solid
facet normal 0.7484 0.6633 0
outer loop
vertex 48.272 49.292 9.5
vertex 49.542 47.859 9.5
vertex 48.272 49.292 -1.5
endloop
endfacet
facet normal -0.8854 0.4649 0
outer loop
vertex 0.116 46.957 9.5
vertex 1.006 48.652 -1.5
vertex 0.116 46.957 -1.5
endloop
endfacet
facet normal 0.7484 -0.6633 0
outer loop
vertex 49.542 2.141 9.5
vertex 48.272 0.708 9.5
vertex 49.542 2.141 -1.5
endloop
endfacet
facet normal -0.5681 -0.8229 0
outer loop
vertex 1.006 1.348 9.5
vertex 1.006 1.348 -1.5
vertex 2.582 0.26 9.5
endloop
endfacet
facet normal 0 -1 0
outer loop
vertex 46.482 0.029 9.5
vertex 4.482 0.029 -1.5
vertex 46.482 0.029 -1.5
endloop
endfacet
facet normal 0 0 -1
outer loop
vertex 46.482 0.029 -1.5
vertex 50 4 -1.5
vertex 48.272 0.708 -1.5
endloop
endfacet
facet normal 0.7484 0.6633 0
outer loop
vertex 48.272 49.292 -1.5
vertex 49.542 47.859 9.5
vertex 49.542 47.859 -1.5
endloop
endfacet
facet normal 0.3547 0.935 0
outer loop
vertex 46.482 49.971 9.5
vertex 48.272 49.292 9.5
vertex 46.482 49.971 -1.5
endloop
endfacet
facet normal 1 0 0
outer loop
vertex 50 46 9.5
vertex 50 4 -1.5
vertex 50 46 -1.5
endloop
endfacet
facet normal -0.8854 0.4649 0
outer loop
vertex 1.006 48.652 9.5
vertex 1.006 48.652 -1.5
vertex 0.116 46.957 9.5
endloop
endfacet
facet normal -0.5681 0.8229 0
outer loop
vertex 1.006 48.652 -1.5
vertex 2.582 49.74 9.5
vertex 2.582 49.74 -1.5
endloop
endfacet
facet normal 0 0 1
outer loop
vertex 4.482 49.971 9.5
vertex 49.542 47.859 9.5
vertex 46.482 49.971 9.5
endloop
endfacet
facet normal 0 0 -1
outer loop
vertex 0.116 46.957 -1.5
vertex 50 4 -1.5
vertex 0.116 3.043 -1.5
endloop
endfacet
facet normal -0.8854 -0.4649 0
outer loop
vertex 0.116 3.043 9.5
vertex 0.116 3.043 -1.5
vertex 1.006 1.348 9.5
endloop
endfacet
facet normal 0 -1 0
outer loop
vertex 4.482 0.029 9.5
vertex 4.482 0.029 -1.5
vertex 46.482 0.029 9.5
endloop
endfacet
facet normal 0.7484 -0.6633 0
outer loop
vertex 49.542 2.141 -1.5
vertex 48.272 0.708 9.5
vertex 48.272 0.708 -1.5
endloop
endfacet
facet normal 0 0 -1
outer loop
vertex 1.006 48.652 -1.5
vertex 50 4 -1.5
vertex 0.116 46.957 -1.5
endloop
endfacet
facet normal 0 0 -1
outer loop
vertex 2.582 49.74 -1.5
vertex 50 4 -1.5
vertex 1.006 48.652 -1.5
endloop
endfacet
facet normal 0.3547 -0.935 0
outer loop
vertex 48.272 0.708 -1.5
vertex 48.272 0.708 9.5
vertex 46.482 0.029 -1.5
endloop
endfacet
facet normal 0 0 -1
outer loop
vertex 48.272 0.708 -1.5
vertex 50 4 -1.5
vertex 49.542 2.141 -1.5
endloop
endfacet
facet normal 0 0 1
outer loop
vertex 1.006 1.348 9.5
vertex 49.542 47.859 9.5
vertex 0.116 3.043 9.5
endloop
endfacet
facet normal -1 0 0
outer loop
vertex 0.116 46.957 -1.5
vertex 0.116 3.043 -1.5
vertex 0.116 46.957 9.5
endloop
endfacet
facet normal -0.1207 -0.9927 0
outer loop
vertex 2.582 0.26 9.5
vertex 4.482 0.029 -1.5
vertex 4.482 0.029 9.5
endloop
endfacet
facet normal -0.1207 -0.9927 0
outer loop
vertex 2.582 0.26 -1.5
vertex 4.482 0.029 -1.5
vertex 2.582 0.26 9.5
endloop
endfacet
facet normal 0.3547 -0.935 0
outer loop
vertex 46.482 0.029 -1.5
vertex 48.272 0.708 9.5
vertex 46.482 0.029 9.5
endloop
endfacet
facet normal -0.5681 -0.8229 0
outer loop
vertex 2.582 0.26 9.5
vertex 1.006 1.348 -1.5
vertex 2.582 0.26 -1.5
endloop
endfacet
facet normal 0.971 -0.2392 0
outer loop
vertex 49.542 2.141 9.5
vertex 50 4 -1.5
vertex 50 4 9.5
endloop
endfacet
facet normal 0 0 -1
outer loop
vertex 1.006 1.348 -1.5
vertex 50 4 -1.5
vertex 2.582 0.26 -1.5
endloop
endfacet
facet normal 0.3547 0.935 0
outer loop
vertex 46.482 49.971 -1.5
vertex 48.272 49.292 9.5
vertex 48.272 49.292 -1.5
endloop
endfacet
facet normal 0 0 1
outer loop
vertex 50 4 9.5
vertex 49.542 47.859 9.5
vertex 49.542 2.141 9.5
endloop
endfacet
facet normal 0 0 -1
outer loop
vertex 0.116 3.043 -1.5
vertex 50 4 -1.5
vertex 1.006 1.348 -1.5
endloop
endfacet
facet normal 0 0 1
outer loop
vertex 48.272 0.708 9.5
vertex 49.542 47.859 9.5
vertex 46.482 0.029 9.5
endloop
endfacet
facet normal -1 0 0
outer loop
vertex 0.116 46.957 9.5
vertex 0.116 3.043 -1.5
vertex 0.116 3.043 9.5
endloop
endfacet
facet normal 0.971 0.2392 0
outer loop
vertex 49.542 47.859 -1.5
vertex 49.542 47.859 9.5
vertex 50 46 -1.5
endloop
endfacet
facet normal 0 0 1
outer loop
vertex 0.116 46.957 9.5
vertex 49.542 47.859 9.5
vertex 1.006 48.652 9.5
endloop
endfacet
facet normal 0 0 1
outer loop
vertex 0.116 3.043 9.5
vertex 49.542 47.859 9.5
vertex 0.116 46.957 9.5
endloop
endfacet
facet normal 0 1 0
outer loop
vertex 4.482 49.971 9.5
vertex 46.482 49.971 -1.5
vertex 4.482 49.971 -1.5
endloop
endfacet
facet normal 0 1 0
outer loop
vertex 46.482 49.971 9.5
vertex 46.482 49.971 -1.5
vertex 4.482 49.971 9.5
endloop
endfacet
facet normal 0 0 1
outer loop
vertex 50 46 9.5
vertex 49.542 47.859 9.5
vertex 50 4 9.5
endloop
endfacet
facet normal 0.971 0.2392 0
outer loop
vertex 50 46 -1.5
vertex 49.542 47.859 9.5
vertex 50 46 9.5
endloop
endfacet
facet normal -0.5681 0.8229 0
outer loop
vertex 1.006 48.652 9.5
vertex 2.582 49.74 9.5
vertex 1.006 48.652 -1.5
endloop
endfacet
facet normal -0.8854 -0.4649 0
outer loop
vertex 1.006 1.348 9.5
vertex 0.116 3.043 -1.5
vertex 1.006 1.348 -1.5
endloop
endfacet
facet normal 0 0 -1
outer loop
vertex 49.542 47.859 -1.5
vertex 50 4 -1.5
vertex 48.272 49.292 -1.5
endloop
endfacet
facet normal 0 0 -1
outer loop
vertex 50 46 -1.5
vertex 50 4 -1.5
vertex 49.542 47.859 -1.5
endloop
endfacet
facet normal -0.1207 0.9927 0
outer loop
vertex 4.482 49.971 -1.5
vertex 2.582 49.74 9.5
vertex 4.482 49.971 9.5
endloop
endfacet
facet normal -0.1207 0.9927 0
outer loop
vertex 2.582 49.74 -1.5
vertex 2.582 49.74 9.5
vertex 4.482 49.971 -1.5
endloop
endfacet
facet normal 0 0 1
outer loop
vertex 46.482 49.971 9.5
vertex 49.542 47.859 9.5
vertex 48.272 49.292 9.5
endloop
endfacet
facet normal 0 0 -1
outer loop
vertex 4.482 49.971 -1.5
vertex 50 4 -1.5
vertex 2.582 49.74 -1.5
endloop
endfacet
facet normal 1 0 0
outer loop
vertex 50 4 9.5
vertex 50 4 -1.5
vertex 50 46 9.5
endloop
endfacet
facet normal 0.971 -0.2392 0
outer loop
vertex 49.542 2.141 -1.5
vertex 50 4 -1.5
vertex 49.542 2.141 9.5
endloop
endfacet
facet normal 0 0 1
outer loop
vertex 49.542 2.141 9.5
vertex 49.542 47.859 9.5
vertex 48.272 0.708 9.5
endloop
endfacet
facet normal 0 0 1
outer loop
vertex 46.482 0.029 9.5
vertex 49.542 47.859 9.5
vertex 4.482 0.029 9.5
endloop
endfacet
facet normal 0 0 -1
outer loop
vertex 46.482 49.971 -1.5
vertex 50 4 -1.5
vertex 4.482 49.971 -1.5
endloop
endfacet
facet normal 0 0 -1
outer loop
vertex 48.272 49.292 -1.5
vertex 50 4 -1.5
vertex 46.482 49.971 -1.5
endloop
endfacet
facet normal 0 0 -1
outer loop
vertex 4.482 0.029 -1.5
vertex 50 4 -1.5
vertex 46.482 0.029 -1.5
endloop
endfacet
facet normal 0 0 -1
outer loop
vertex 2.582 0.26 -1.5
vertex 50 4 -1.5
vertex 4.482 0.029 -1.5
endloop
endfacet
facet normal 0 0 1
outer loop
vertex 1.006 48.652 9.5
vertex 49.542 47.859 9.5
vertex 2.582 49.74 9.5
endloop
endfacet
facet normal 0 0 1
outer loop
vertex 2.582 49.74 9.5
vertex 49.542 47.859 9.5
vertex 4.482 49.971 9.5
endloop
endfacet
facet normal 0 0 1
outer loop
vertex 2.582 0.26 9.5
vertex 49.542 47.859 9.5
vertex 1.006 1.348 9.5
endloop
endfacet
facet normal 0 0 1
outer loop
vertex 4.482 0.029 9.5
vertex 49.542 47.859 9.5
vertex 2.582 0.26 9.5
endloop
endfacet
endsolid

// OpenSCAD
height = 10;
width = 42;
minky = 4;

minkowski() {
  cylinder(r=minky, center=true);
  translate([
    ((width + minky + minky) / 2),
    ((width + minky + minky) / 2),
    minky 
  ])cube([width, width, height], center=true);
}
